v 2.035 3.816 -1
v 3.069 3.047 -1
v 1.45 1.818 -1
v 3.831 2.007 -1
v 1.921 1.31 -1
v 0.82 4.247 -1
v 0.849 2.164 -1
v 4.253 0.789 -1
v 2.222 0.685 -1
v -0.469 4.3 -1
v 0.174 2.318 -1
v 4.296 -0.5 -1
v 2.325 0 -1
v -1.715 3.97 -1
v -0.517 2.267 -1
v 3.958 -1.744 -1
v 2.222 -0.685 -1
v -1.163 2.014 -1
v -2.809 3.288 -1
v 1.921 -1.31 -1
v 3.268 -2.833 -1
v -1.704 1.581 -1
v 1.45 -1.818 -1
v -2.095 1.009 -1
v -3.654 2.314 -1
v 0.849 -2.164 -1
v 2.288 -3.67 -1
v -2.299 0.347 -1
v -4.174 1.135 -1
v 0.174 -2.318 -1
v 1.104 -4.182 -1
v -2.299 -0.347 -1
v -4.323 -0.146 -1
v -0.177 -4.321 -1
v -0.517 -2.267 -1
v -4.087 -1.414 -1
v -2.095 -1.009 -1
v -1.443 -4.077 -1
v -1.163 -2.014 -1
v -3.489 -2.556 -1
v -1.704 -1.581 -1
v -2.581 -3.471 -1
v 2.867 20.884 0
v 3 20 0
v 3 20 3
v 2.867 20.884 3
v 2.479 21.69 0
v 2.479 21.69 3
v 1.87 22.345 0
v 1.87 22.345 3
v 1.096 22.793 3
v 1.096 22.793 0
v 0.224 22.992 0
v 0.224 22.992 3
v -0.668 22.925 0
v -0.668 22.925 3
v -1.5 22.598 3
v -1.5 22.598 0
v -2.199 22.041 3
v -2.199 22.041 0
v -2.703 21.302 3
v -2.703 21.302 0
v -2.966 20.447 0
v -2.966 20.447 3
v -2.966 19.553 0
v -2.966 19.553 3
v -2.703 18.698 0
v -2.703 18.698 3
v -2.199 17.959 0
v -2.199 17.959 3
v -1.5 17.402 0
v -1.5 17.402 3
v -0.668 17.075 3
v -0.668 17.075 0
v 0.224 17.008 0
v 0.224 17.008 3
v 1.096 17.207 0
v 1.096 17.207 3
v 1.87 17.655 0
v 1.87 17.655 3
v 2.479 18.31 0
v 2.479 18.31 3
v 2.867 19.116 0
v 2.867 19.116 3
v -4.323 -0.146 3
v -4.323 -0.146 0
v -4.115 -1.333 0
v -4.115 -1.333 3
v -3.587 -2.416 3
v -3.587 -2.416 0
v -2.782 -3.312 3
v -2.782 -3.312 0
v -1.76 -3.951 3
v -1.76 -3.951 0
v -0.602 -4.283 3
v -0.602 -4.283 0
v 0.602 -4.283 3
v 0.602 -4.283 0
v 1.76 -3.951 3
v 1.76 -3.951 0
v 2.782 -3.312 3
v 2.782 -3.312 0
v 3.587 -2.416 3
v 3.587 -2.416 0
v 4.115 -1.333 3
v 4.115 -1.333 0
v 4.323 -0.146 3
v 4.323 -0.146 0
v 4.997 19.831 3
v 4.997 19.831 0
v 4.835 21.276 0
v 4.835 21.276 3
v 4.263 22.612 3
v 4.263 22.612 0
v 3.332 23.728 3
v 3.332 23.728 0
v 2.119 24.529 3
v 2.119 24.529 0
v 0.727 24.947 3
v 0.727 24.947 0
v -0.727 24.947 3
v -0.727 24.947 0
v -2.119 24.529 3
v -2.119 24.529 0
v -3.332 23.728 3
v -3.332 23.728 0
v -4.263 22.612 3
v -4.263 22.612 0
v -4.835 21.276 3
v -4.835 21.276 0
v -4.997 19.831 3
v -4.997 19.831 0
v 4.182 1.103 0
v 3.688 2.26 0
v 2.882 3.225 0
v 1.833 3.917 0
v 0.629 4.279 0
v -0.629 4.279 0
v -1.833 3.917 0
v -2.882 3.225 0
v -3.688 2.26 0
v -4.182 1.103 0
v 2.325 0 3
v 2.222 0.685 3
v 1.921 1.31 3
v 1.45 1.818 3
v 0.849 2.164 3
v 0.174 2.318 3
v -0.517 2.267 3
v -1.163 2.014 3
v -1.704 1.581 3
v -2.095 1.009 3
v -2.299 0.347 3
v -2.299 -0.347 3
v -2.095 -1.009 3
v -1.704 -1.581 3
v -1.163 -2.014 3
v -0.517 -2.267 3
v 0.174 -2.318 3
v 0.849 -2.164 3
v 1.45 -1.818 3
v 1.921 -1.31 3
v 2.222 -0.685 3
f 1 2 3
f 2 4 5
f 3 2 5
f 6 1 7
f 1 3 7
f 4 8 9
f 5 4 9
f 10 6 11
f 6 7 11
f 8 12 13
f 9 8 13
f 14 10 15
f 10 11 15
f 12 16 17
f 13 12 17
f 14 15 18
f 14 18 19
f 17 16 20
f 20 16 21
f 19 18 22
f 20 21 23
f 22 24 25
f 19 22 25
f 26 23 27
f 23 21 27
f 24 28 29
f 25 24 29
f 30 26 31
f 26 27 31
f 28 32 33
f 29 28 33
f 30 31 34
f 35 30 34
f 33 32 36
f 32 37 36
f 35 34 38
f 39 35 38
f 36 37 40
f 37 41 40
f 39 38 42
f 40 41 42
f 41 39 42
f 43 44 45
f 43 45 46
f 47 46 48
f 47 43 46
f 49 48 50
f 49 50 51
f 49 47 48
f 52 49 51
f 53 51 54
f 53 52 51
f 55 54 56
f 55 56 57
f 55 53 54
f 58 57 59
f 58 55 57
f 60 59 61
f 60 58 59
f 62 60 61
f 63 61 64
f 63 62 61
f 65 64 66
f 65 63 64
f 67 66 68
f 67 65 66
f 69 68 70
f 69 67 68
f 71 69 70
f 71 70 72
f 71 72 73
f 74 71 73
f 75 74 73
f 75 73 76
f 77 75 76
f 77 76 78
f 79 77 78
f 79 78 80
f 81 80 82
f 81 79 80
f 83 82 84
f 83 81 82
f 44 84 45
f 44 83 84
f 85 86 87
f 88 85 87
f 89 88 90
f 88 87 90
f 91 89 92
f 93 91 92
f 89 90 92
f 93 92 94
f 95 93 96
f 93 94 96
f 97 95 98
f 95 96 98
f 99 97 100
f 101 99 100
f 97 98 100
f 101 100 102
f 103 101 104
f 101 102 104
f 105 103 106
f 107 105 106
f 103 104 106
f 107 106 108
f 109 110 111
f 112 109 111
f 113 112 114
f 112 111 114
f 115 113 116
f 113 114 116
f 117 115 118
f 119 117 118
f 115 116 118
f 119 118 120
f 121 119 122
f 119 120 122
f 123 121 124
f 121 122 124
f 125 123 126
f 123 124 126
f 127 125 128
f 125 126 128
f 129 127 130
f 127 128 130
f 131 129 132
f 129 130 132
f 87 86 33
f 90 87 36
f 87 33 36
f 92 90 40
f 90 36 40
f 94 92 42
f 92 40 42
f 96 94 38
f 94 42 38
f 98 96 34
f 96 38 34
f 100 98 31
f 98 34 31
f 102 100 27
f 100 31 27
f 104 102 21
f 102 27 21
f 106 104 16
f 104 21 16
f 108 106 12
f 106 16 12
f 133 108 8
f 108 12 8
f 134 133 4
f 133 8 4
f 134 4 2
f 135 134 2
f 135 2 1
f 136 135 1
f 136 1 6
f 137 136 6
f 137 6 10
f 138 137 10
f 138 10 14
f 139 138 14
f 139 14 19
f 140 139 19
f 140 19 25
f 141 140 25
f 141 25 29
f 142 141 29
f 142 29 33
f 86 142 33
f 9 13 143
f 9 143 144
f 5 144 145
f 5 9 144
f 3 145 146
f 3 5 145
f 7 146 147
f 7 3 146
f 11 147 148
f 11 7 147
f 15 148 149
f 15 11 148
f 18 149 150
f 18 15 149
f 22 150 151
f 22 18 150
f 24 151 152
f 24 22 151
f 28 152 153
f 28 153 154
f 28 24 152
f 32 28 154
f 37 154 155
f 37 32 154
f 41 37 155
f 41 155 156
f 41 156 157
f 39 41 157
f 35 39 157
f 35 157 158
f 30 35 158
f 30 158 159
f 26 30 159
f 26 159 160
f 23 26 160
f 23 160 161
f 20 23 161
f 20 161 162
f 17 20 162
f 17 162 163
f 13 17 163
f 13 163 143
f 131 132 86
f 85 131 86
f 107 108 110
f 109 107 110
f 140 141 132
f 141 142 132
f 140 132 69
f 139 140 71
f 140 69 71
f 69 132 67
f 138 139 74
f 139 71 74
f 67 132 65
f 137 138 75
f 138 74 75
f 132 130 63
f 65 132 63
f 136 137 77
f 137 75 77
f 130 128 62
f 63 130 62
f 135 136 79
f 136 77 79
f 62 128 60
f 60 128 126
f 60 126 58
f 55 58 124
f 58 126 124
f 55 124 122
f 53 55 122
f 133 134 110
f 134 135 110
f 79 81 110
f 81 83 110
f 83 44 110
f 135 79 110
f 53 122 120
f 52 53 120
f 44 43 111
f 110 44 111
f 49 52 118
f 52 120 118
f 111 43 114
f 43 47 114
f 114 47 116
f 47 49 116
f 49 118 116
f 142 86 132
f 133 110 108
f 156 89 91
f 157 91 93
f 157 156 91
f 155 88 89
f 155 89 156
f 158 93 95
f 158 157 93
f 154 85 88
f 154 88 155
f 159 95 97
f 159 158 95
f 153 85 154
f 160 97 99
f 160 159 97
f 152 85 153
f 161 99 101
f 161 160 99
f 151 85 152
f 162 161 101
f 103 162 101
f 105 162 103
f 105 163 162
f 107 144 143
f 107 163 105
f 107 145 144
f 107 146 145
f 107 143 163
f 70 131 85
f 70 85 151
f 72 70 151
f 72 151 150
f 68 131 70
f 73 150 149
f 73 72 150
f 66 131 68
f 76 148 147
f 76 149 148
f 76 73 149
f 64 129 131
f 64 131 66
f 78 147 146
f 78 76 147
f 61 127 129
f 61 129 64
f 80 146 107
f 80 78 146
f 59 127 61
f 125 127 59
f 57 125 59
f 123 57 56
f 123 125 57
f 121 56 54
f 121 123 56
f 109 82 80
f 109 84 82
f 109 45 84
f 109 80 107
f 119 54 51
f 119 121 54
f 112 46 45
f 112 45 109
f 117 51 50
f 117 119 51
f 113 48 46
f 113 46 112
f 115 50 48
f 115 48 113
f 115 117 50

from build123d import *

# Parameters (mm, degrees)
SKETCH1_R           = 2.325
SKETCH1_R_2         = 3
BOSS_EXTRUDE1_DEPTH = 3
BOSS_EXTRUDE2_START = -1
SKETCH1_3_R         = 4.325
SKETCH1_3_R_2       = 2.325
BOSS_EXTRUDE2_DEPTH = 1


with BuildPart() as part:
    # Sketch1 → Boss-Extrude1 (new body)
    with BuildSketch(Plane.XY):
        with BuildLine():
            Line((-4.997151532, 19.83125), (-4.322536076, -0.14596875))
            ThreePointArc((-4.322536076, -0.14596875), (0, -4.325), (4.322536076, -0.14596875))
            Line((4.322536076, -0.14596875), (4.997151532, 19.83125))
            ThreePointArc((4.997151532, 19.83125), (0, 25), (-4.997151532, 19.83125))
        make_face()
        Circle(SKETCH1_R, mode=Mode.SUBTRACT)
        with Locations((0, 20)):
            Circle(SKETCH1_R_2, mode=Mode.SUBTRACT)
    extrude(amount=BOSS_EXTRUDE1_DEPTH)

    # Sketch1<3> → Boss-Extrude2 (add)
    with BuildSketch(Plane.XY.offset(BOSS_EXTRUDE2_START)):
        with Locations(Location((0, 0, 0), (0, 0, 181.934099854))):
            Circle(SKETCH1_3_R)
        Circle(SKETCH1_3_R_2, mode=Mode.SUBTRACT)
    extrude(amount=BOSS_EXTRUDE2_DEPTH)


solid = part.part
